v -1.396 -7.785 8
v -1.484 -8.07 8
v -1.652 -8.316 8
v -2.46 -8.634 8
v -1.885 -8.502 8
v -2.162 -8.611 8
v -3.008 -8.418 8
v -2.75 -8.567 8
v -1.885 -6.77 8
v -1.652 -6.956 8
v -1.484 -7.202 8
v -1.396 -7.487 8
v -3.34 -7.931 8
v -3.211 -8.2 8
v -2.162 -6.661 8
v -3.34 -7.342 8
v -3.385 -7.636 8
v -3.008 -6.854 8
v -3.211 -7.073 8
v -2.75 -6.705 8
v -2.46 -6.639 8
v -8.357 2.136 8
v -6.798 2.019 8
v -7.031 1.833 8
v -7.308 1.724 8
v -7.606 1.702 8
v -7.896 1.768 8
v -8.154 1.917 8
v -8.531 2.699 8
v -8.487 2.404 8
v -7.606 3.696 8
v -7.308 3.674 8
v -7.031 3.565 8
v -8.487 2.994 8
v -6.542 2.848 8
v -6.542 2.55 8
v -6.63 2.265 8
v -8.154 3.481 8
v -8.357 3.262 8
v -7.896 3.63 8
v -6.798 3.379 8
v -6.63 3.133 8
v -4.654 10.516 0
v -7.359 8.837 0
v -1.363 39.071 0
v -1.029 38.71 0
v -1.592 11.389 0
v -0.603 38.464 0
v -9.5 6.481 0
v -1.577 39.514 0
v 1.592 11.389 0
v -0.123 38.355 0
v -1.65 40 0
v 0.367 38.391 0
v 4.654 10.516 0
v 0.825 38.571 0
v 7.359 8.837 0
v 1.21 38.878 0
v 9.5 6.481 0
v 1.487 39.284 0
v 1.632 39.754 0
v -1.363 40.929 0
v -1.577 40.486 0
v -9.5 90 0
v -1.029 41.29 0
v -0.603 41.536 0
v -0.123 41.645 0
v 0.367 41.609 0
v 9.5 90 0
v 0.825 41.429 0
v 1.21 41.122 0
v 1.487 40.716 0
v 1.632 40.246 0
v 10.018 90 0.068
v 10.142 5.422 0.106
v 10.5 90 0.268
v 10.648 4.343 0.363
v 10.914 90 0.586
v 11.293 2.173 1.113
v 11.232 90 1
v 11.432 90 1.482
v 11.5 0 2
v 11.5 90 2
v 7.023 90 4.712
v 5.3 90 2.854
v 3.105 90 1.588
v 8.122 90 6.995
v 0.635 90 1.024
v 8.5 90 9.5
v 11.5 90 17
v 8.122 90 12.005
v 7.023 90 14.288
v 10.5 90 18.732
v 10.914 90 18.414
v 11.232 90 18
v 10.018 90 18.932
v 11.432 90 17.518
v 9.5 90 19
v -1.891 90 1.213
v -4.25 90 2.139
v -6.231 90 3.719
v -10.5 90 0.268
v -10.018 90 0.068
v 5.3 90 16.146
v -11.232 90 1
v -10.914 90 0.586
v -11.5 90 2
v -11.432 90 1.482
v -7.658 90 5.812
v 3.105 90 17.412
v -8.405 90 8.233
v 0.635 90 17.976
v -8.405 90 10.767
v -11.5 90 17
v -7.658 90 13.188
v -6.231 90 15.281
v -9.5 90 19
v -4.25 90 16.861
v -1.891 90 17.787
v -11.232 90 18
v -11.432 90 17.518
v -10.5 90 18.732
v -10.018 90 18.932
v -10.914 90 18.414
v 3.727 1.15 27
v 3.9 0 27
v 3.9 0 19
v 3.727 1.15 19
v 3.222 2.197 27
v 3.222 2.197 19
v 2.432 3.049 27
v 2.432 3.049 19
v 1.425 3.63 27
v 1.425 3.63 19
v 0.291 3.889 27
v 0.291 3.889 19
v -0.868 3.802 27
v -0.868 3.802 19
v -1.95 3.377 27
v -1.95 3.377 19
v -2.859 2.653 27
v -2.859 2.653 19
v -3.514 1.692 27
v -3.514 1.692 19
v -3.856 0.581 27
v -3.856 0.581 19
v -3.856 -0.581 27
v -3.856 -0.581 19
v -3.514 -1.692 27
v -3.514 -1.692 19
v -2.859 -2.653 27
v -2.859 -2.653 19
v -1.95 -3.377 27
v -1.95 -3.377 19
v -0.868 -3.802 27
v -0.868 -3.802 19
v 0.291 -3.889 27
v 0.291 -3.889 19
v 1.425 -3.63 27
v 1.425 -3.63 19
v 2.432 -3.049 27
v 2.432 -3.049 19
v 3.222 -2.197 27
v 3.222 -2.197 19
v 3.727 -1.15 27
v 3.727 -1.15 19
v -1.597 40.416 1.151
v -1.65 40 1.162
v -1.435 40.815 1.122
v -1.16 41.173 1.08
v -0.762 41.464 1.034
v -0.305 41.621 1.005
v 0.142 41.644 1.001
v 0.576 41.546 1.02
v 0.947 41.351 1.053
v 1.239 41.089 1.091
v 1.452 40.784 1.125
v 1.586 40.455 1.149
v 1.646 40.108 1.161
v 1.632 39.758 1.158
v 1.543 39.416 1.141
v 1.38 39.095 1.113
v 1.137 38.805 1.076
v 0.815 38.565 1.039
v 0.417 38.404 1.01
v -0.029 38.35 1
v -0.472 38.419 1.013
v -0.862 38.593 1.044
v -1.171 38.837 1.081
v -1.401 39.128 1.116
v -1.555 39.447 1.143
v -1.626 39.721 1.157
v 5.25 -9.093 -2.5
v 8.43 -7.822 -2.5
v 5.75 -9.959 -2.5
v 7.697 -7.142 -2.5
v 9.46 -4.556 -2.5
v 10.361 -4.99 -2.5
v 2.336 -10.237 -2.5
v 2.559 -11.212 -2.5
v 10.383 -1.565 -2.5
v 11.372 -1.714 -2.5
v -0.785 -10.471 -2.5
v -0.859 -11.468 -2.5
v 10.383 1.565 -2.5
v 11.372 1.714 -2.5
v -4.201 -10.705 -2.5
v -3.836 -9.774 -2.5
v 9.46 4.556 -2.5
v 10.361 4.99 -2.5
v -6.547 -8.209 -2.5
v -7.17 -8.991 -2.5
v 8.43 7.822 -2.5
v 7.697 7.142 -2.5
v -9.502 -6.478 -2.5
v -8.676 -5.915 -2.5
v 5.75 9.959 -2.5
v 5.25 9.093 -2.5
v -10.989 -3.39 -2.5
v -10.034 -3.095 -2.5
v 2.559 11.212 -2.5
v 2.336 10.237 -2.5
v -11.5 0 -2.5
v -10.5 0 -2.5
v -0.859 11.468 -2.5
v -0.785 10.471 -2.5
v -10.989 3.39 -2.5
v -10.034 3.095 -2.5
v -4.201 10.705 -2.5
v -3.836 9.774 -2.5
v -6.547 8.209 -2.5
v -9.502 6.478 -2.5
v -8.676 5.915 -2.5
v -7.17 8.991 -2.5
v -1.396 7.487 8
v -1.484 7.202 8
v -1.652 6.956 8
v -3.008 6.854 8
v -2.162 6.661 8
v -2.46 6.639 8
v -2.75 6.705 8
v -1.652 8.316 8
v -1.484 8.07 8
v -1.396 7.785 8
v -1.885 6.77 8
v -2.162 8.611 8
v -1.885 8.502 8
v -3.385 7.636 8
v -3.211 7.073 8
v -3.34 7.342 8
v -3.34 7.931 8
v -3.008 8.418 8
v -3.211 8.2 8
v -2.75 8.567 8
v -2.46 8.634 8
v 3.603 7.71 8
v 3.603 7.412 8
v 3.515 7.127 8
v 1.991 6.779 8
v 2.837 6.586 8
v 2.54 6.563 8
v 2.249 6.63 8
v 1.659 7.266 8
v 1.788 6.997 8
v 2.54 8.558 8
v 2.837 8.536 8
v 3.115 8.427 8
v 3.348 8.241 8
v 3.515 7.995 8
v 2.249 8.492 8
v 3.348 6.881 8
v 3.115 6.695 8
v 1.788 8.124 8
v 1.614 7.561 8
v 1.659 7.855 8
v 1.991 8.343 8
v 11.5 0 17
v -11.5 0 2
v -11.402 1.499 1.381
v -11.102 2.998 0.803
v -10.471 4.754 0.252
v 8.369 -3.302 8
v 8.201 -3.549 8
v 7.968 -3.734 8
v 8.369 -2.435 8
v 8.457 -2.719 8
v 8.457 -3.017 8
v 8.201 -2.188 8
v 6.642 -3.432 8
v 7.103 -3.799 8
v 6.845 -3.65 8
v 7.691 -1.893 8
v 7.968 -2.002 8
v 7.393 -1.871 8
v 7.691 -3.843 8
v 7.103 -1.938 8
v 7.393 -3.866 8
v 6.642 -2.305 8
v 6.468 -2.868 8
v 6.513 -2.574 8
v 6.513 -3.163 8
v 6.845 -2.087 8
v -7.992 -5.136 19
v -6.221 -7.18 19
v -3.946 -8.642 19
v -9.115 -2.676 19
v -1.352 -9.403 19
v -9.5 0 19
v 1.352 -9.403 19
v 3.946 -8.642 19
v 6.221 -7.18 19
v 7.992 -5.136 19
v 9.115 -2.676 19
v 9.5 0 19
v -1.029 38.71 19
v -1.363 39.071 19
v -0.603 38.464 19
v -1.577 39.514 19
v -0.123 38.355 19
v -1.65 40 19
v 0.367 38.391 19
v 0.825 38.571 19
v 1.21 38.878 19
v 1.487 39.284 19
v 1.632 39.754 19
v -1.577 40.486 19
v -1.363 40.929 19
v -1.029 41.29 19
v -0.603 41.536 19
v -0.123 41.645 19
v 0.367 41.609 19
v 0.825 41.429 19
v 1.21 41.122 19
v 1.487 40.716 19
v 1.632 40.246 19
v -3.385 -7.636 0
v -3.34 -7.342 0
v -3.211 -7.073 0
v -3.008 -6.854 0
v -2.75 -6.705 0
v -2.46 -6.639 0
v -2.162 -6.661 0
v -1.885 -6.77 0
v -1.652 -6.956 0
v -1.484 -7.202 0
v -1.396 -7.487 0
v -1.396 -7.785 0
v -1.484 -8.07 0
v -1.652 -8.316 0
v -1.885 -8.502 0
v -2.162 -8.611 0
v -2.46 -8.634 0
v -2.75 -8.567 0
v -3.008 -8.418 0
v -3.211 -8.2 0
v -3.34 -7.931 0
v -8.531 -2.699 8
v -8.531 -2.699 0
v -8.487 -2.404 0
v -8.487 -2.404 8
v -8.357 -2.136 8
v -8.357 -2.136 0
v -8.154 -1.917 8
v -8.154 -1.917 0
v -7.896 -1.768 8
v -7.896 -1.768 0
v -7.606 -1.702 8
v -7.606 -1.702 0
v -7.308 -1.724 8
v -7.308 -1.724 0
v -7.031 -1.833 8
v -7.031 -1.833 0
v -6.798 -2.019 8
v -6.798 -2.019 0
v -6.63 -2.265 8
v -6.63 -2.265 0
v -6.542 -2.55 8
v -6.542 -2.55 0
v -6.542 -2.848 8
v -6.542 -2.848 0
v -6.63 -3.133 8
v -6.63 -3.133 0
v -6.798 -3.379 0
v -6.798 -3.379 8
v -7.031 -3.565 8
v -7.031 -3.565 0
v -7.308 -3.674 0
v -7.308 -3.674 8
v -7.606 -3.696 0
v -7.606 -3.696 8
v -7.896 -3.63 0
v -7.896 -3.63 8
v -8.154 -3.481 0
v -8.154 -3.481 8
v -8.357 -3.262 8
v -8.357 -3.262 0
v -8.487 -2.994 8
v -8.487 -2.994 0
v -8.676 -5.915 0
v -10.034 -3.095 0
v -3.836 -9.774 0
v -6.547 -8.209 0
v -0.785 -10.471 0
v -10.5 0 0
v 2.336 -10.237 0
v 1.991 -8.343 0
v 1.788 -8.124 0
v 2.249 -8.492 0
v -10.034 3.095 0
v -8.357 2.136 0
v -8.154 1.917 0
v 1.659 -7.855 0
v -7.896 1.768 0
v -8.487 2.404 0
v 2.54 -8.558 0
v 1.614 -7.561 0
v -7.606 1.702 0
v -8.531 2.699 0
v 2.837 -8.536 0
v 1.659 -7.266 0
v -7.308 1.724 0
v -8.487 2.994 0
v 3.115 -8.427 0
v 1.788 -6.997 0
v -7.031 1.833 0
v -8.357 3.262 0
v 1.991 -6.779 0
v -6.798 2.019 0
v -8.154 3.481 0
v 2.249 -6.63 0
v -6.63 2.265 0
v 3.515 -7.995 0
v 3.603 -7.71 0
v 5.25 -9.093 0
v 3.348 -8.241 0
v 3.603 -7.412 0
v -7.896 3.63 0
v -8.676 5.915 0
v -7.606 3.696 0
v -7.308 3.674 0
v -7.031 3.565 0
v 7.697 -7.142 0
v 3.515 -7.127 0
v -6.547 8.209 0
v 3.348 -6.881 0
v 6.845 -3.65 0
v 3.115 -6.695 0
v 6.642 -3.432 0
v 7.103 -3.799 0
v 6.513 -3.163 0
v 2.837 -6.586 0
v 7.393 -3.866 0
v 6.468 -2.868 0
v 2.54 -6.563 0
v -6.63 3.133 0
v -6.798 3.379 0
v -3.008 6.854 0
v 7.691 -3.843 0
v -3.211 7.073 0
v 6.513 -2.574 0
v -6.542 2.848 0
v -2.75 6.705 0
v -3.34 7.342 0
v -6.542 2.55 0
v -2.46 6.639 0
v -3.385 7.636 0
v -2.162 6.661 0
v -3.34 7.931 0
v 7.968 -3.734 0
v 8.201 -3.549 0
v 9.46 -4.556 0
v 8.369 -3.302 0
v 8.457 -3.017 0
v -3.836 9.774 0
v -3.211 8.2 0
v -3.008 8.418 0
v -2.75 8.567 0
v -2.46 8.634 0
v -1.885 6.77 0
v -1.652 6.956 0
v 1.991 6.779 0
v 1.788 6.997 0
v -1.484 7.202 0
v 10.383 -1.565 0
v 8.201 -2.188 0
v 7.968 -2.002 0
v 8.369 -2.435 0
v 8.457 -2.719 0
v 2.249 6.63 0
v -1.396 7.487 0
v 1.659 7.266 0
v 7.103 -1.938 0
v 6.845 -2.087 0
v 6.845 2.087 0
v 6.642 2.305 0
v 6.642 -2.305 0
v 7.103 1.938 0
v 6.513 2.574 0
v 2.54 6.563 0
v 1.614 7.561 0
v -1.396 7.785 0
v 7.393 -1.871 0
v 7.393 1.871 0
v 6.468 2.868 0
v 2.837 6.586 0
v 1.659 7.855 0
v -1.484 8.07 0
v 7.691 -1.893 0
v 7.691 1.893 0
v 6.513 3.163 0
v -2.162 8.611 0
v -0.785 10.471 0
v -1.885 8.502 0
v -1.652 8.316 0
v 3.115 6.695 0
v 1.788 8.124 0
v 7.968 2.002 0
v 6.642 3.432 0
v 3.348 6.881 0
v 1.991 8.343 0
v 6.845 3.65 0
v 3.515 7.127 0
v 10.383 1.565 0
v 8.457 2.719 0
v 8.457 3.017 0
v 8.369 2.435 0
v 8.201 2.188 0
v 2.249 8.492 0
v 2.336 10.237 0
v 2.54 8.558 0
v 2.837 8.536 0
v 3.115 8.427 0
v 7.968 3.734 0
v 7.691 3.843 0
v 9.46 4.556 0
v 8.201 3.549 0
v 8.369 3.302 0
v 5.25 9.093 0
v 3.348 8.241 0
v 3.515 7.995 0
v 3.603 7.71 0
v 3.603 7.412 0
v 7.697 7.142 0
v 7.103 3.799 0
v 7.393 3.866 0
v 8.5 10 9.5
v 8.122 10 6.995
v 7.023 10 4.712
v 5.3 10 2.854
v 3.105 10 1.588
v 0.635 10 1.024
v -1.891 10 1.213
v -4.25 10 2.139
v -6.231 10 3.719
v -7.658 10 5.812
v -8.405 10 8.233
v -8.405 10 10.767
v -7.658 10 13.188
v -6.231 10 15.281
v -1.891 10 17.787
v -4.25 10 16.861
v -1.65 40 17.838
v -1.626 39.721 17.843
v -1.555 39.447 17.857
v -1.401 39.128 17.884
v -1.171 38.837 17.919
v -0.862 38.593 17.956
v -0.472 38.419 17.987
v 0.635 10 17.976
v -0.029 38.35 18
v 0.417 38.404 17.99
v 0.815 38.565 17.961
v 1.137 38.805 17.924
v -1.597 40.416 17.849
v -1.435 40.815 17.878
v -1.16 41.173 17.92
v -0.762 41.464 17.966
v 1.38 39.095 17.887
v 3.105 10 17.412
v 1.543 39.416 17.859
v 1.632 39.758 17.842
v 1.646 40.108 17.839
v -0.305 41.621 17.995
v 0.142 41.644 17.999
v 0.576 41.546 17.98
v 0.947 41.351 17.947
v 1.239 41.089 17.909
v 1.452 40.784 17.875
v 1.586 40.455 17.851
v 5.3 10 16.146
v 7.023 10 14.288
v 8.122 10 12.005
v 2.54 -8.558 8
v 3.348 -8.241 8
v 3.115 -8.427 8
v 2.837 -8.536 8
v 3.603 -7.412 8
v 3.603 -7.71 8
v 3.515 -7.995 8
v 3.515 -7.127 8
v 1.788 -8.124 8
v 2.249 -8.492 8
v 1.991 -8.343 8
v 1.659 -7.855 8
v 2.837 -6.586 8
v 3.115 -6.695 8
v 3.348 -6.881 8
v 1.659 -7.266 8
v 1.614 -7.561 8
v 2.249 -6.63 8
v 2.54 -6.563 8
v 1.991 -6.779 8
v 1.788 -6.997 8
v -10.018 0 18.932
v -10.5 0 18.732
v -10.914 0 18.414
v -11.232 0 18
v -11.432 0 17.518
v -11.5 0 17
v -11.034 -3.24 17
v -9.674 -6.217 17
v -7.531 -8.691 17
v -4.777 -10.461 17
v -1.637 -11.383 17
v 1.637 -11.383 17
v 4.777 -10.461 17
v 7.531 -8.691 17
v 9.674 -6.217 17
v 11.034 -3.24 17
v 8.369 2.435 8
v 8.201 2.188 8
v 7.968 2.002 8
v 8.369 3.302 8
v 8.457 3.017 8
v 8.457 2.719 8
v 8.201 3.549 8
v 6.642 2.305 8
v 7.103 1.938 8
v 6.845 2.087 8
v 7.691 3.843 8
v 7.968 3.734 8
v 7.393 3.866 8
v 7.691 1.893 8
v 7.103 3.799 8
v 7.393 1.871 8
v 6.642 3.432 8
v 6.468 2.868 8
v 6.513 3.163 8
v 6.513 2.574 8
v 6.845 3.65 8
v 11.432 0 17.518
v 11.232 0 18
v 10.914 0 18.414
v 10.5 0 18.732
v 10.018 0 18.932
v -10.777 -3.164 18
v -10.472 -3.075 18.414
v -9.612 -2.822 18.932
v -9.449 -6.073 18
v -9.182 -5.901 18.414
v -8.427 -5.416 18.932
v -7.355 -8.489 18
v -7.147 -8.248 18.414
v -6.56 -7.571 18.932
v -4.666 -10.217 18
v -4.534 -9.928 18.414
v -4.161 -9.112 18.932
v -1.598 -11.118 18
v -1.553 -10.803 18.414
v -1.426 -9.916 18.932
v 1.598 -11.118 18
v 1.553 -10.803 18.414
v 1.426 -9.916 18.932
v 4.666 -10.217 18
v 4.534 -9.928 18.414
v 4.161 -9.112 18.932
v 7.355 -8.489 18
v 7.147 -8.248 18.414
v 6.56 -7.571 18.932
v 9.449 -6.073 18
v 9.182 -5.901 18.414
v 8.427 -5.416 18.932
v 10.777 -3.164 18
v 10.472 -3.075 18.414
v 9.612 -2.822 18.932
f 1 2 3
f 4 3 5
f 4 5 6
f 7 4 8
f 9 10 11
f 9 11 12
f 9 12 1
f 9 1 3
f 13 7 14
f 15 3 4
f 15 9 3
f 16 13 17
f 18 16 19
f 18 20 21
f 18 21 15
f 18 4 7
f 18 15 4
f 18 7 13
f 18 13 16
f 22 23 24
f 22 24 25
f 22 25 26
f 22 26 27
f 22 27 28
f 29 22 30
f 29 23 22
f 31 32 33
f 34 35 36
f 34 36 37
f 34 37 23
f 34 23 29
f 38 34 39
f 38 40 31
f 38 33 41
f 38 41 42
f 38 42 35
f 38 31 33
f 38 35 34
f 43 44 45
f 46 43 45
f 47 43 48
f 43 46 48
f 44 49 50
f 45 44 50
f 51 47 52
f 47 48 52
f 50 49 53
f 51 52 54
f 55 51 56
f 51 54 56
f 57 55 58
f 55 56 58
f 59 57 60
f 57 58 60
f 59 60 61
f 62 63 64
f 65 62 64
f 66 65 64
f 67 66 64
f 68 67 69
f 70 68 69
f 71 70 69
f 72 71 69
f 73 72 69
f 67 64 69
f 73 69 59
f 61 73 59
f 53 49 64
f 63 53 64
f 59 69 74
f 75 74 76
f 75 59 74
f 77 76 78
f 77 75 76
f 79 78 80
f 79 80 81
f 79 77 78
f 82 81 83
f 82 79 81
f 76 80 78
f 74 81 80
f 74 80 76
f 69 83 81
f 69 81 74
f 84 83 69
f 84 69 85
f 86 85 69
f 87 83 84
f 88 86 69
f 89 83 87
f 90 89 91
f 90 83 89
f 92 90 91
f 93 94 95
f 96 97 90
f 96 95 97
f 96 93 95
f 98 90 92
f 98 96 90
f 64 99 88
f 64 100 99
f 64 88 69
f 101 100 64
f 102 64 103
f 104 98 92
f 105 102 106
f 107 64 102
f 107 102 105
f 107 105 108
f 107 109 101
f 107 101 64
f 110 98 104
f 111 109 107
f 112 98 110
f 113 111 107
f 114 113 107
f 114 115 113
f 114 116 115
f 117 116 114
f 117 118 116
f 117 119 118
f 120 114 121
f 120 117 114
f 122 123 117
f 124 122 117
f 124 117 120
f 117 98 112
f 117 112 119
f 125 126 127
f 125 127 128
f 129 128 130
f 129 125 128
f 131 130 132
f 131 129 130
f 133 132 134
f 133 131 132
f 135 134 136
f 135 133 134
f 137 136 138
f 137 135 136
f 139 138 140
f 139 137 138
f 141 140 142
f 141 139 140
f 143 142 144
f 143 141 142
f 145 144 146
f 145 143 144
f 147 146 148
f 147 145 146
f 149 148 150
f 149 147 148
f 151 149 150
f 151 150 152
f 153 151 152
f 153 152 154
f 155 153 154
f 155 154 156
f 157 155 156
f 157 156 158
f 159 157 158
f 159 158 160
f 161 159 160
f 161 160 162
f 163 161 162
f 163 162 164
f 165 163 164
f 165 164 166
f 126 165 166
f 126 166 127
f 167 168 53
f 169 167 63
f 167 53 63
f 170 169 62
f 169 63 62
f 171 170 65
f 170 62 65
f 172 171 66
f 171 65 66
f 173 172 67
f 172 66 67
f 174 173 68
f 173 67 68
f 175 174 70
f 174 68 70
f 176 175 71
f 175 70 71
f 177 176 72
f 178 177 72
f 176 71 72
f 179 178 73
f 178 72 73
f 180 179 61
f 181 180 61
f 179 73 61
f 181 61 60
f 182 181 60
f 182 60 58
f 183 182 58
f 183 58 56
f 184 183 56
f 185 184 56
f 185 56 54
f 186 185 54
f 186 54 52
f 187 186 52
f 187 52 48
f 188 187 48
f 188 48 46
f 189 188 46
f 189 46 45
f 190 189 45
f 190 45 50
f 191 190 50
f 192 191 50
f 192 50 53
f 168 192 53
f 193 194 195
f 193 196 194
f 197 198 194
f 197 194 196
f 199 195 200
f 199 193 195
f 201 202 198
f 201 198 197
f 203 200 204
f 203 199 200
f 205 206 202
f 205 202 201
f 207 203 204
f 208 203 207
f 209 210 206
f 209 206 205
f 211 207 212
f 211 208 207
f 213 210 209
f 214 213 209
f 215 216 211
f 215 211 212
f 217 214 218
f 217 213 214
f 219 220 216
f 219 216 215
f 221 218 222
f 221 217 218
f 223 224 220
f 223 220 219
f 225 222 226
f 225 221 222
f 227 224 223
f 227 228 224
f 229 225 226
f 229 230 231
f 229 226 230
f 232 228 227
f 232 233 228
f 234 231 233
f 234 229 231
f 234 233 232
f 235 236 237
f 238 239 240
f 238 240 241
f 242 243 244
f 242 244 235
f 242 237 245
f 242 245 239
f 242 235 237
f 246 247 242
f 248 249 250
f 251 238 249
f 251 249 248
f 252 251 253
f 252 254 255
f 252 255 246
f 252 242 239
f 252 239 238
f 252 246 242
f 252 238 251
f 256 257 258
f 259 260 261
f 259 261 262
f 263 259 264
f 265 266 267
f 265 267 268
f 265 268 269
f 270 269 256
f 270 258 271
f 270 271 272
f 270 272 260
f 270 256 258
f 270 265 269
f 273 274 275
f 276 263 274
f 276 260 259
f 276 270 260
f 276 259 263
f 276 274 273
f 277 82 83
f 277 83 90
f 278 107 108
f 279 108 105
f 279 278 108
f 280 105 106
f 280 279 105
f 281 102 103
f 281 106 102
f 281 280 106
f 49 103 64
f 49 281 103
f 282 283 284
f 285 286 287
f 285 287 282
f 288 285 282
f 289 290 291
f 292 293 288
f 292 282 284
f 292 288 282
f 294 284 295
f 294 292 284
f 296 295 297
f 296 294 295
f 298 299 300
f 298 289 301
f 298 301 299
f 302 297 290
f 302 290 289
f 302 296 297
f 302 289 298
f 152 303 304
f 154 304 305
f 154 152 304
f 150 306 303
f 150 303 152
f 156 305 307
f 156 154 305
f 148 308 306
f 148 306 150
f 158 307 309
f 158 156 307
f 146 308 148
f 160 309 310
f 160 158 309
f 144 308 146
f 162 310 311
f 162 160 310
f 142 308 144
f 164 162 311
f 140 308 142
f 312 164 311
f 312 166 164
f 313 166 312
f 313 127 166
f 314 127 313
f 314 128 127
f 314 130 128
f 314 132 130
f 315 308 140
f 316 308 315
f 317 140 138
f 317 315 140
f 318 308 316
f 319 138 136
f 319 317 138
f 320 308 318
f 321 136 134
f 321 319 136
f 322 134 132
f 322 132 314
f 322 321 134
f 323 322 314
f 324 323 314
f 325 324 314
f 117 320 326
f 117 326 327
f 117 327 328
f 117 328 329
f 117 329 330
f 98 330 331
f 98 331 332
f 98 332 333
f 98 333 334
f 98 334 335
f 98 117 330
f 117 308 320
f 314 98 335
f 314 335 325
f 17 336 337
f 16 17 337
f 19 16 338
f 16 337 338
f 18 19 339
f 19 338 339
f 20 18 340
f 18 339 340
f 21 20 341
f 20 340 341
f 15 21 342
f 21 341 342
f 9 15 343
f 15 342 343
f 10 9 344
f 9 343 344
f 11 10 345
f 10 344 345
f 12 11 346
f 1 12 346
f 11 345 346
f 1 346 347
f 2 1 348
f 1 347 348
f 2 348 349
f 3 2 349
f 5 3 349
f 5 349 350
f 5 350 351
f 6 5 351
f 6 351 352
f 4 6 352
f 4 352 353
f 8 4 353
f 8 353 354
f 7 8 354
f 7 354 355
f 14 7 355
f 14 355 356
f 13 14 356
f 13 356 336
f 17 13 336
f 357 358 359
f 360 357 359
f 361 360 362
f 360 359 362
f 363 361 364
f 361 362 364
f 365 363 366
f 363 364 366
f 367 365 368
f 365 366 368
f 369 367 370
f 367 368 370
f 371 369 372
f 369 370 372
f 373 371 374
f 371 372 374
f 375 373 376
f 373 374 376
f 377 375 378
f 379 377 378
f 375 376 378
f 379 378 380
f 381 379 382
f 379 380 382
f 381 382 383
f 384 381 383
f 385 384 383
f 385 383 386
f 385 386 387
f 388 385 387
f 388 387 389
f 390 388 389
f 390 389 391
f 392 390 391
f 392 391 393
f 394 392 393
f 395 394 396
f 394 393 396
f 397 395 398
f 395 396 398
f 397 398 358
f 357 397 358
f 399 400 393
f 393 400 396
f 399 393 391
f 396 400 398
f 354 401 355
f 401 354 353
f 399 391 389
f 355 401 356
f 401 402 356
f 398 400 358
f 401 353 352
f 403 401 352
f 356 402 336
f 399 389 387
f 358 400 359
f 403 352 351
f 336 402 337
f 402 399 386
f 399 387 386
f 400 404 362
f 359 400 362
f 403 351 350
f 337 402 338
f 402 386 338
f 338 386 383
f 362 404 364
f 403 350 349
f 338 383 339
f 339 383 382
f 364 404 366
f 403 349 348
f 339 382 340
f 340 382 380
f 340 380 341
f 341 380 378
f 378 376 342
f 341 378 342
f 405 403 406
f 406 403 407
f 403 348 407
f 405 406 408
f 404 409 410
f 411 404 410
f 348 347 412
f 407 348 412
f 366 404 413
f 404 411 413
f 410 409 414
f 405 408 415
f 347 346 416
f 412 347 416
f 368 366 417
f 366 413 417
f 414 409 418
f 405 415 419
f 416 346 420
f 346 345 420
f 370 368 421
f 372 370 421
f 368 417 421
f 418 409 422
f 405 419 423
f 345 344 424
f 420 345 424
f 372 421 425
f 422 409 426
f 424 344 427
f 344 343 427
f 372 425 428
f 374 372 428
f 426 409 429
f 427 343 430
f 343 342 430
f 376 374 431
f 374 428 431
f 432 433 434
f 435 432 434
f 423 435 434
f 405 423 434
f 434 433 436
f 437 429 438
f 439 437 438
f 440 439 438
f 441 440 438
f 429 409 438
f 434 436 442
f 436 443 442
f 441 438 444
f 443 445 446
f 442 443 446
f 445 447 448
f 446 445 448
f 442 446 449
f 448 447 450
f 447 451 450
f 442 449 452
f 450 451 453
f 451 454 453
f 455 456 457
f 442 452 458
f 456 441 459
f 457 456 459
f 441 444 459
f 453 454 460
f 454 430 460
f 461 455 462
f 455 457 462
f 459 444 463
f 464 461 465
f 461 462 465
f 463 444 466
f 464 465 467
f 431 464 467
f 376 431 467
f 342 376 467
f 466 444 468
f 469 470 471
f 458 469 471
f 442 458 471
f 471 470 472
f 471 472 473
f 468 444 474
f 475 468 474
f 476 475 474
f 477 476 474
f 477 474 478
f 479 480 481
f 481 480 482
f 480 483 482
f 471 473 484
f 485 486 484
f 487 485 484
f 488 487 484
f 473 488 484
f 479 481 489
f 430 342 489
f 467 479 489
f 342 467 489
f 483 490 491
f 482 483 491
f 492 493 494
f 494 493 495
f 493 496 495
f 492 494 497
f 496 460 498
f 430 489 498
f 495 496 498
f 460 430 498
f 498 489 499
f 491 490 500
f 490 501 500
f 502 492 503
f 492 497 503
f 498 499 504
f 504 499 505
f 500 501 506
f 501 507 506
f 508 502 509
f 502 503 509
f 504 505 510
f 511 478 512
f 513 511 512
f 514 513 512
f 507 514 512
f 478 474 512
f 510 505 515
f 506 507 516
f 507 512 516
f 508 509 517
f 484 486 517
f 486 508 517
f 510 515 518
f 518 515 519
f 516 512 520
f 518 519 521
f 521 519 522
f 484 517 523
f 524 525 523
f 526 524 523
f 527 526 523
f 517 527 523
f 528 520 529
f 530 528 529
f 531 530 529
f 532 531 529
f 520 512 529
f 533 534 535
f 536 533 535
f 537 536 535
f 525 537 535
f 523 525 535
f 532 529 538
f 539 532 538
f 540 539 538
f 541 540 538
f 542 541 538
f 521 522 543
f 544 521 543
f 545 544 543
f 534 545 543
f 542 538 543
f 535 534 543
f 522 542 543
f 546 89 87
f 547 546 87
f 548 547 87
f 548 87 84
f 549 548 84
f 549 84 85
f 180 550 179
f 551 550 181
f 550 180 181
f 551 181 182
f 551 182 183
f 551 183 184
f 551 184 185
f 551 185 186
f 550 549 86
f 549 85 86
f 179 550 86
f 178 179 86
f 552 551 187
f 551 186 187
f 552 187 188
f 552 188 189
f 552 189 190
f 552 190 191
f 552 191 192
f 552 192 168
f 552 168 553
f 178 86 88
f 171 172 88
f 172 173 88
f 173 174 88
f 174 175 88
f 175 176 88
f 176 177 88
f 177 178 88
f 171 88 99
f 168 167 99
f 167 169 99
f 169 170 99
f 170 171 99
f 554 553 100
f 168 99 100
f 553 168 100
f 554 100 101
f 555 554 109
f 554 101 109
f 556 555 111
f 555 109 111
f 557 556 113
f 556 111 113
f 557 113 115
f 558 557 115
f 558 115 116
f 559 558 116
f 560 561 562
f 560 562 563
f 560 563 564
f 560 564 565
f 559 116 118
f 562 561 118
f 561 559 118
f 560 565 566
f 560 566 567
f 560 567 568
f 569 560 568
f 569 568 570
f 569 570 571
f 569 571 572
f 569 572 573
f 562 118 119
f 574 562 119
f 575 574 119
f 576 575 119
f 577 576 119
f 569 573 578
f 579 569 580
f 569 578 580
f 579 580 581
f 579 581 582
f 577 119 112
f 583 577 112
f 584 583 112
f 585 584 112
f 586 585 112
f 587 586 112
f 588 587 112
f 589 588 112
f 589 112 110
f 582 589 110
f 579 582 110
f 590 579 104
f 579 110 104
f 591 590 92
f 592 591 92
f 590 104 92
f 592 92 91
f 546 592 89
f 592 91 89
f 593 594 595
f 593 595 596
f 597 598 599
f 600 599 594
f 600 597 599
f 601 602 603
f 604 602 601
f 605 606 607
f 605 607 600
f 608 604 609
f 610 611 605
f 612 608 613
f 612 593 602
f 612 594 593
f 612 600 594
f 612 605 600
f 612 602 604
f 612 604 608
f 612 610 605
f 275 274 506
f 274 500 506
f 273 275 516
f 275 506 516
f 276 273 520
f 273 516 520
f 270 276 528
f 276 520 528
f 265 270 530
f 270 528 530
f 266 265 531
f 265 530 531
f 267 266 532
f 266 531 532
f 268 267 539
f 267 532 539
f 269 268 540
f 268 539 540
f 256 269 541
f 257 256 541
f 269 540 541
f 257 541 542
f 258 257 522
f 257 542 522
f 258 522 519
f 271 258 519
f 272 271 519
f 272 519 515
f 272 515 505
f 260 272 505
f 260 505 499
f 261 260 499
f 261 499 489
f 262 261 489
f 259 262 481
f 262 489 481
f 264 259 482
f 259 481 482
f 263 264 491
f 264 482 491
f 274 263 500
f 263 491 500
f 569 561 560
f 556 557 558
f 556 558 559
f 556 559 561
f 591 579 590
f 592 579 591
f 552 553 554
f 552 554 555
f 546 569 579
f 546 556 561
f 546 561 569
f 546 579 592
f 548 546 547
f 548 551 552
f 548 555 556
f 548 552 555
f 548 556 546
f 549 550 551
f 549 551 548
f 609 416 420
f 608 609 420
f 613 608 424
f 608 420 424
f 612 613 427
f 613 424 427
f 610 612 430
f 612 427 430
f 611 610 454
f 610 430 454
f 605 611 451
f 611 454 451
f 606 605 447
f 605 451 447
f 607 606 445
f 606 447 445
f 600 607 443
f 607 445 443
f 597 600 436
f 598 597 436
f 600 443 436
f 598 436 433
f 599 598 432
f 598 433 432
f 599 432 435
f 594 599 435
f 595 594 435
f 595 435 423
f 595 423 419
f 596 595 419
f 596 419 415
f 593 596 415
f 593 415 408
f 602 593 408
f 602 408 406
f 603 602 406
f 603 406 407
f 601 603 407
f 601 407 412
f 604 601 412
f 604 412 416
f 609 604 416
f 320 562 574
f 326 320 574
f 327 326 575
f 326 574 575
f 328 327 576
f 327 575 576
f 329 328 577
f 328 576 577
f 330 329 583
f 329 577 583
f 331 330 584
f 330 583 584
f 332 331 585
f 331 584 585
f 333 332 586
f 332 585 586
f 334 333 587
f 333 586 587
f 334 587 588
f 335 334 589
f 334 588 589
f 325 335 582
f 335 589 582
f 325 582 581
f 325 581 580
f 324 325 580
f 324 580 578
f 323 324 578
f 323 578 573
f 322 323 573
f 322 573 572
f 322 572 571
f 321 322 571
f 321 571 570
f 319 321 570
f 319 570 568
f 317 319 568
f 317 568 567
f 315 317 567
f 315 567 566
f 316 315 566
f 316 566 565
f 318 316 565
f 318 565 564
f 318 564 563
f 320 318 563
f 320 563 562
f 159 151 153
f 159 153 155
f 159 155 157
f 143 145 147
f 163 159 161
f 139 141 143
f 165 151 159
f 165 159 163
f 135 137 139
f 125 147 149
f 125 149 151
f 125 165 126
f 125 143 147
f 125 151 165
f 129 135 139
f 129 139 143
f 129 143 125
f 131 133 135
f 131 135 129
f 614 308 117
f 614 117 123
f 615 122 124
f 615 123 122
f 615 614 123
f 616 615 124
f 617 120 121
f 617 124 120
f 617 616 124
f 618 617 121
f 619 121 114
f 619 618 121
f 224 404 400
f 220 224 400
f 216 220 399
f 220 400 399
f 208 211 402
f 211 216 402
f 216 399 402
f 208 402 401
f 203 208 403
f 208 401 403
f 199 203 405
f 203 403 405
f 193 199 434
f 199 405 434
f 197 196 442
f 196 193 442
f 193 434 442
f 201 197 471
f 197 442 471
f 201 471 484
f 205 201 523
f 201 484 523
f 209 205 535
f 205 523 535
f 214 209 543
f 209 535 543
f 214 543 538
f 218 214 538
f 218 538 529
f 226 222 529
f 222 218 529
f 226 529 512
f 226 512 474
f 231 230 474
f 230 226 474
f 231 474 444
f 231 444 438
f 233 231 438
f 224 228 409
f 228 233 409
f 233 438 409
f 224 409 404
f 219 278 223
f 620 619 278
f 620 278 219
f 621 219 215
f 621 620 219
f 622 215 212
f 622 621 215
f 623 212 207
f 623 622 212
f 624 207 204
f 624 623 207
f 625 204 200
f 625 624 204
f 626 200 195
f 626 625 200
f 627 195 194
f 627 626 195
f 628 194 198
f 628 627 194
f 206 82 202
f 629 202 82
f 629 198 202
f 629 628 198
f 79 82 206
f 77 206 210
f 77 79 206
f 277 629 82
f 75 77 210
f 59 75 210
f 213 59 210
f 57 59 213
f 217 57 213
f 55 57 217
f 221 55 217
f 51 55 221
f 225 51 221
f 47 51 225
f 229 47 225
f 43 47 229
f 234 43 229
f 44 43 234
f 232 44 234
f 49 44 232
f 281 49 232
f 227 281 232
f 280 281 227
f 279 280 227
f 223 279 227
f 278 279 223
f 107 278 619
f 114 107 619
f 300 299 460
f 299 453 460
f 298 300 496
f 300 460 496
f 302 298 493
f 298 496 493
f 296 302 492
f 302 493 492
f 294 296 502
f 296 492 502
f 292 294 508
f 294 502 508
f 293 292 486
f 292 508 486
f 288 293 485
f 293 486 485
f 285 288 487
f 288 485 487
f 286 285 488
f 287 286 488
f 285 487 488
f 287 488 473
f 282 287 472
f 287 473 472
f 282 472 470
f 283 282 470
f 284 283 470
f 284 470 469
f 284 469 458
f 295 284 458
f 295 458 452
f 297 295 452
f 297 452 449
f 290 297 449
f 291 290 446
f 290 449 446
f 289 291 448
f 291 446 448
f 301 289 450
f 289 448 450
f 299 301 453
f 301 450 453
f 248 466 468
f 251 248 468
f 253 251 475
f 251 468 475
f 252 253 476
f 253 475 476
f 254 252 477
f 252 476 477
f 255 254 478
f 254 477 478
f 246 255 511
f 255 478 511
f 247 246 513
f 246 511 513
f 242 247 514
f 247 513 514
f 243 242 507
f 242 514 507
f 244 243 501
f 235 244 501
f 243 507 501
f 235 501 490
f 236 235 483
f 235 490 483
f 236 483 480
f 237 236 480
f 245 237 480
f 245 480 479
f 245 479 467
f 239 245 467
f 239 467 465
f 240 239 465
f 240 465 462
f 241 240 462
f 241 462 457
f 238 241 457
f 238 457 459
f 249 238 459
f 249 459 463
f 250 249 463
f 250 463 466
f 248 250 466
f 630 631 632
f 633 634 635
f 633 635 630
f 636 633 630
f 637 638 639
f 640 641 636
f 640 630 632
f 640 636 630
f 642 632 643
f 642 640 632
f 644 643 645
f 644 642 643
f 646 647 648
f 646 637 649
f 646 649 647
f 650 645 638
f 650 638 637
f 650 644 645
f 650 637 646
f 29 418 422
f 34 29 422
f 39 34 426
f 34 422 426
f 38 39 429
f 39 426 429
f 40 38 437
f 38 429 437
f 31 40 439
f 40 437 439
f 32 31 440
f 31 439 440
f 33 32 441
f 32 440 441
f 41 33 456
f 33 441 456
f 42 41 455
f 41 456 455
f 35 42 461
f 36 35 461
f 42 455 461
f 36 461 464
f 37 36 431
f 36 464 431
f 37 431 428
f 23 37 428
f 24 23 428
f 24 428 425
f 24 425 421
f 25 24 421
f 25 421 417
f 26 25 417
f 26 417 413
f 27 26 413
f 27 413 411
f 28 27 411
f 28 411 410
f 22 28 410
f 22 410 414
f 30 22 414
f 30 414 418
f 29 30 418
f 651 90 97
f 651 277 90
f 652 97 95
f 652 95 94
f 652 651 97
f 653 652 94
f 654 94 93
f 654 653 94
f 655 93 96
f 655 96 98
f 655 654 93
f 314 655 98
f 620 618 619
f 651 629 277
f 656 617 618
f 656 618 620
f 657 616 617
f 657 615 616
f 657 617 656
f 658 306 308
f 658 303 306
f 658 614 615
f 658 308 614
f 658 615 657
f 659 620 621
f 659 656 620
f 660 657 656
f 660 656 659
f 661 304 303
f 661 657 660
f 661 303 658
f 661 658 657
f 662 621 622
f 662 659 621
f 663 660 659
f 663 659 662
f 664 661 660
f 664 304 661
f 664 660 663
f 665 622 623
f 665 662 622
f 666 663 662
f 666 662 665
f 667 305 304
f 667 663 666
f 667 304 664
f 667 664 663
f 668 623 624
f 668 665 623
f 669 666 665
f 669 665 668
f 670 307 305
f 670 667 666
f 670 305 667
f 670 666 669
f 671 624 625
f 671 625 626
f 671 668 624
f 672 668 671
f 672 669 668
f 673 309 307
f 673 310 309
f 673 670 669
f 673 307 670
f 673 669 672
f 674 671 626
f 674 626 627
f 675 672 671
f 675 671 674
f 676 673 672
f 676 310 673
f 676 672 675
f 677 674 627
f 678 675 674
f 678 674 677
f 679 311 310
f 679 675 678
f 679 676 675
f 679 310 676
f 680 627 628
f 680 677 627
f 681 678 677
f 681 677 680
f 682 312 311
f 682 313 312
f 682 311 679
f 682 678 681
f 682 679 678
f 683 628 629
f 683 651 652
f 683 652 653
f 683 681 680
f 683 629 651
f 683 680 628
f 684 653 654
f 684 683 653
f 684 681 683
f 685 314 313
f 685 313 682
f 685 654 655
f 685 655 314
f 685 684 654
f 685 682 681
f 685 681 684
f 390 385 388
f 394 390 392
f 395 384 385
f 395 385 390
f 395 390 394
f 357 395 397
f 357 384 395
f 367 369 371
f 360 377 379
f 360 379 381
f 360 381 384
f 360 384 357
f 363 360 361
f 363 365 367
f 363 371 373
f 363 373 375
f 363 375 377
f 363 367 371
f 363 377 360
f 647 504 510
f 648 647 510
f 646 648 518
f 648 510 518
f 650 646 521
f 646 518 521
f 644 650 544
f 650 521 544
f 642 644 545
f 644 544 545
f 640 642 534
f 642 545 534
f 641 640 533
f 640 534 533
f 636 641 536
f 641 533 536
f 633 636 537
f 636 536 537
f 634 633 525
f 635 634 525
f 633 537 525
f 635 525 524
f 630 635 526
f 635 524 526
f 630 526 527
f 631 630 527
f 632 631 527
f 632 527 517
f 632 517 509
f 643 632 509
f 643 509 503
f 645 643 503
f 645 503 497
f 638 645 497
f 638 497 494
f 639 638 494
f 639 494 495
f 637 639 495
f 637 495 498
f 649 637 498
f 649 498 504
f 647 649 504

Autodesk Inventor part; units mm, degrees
ref_plane "YZ Plane" through (0, 0, 0) normal (1, 0, 0) x (0, 1, 0)
ref_plane "XZ Plane" through (0, 0, 0) normal (0, 1, 0) x (-1, 0, 0)
ref_plane "XY Plane" through (0, 0, 0) normal (0, 0, 1) x (1, 0, 0)
sketch "Sketch1" plane through (0, 0, 0) normal (0, 0, 1) x (1, 0, 0)
  circle A0 centre (0, 0) radius 11.5
  dimension "d0" = 23
extrude "Extrusion1" add sketch "Sketch1" along normal blind 26
sketch "Sketch2" plane through (0, 0, 0) normal (0, 1, 0) x (-1, 0, 0)
  line L0 (11.5, 0) -> (11.5, 26) projected
  line L1 (11.5, 26) -> (-11.5, 26) projected
  line L2 (11.5, 0) -> (-11.5, 0) projected
  line L3 (-11.5, 0) -> (-11.5, 26) projected
  line L4 (11.5, 0) -> (-11.5, 19) construction
  line L5 (-11.5, 0) -> (-11.5, 26) construction
  line L6 (-11.5, 0) -> (11.5, 19) construction
  line L7 (11.5, 0) -> (11.5, 26) construction
  line L8 (11.5, 19) -> (-11.5, 19) construction
  line L9 (11.5, 19) -> (-11.5, 19)
  line L10 (-11.5, 19) -> (-11.5, 0)
  line L11 (-11.5, 0) -> (11.5, 0)
  line L12 (11.5, 0) -> (11.5, 19)
  line L13 (11.5, 19) -> (-11.5, 0) construction
  line L14 (-11.5, 19) -> (11.5, 0) construction
  point P0 (0, 0)
  point P1 (11.5, 13)
  point P2 (0, 26)
  point P3 (0, 9.5)
  point P4 (0, 9.5)
  dimension "d15" = 7
extrude "Extrusion2" add sketch "Sketch2" along normal blind 90 contours L2 L3 L9 L0
sketch "Sketch3" plane through (0, 90, 7.5) normal (0, 1, 0) x (1, 0, 0)
  line L0 (-11.5, -11.5) -> (11.5, -11.5) construction
  line L1 (11.5, 7.5) -> (-11.5, 7.5) projected
  line L2 (11.5, -11.5) -> (11.5, 7.5) construction
  line L3 (-11.5, 7.5) -> (-11.5, -11.5) construction
  line L4 (-11.5, 7.5) -> (11.5, 7.5) construction
  circle A0 centre (0, -2) radius 8.5
  line L5 (11.5, -2) -> (-11.5, -2) construction
  line L6 (0, 7.5) -> (0, -11.5) construction
  dimension "d29" = 17
extrude "Extrusion3" cut sketch "Sketch3" against normal blind 80
sketch "Sketch4" plane through (0, 0, 26) normal (0, 0, 1) x (1, 0, 0)
  circle A0 centre (0, 0) radius 3.9
  circle A1 centre (0, 0) radius 11.5
  dimension "d10" = 7.8
  dimension "d11" = 23
extrude "Extrusion4" cut sketch "Sketch4" against normal blind 7
sketch "Sketch5" plane through (0, 0, 26) normal (0, 0, 1) x (1, 0, 0)
  circle A0 centre (0, 0) radius 3.9
  dimension "d18" = 7.8
extrude "Extrusion5" add sketch "Sketch5" along normal blind 1
sketch "Sketch7" plane through (0, 0, 0) normal (0, 0, -1) x (-1, 0, 0)
  circle A0 centre (0, 0) radius 8 construction
  circle A1 centre (-2.6145, 7.5607) radius 1
  circle A2 centre (2.3849, 7.6363) radius 1
  circle A3 centre (7.531, 2.699) radius 1
  circle A4 centre (7.531, -2.699) radius 1
  circle A5 centre (2.3849, -7.6363) radius 1
  circle A6 centre (-2.6145, -7.5607) radius 1
  circle A7 centre (-7.4681, -2.8684) radius 1
  circle A8 centre (-7.4681, 2.8684) radius 1
  dimension "d31" = 16
  dimension "d32" = 15
  dimension "d33" = 15
  dimension "d34" = 5
  dimension "d35" = 5
  dimension "d36" = 2
  dimension "d37" = 2
  dimension "d38" = 2
  dimension "d39" = 2
  dimension "d40" = 2
  dimension "d41" = 2
  dimension "d42" = 2
  dimension "d43" = 2
extrude "Extrusion7" cut sketch "Sketch7" against normal blind 8
sketch "Sketch8" plane through (0, 0, 0) normal (0, 0, -1) x (-1, 0, 0)
  circle A0 centre (0, 0) radius 11.5
  circle A1 centre (0, 0) radius 10.5
  dimension "d46" = 23
  dimension "d47" = 21
extrude "Extrusion8" add sketch "Sketch8" along normal blind 2.5
fillet "Fillet2" radius 2 5 edges at (0, -11.5, 19) (-11.5, 45, 19) (11.5, 45, 19) (11.5, 45, 0) (-11.5, 45, 0)
sketch "Sketch9" plane through (0, 0, 0) normal (0, 0, -1) x (-1, 0, 0)
  circle A0 centre (0, 40) radius 1.65
  line L0 (-9.5, 90) -> (9.5, 90) projected
  point P0 (0, 0)
  dimension "d51" = 3.3
  dimension "d52" = 50
extrude "Extrusion9" cut sketch "Sketch9" against normal through all
properties part number "stick_mount"
